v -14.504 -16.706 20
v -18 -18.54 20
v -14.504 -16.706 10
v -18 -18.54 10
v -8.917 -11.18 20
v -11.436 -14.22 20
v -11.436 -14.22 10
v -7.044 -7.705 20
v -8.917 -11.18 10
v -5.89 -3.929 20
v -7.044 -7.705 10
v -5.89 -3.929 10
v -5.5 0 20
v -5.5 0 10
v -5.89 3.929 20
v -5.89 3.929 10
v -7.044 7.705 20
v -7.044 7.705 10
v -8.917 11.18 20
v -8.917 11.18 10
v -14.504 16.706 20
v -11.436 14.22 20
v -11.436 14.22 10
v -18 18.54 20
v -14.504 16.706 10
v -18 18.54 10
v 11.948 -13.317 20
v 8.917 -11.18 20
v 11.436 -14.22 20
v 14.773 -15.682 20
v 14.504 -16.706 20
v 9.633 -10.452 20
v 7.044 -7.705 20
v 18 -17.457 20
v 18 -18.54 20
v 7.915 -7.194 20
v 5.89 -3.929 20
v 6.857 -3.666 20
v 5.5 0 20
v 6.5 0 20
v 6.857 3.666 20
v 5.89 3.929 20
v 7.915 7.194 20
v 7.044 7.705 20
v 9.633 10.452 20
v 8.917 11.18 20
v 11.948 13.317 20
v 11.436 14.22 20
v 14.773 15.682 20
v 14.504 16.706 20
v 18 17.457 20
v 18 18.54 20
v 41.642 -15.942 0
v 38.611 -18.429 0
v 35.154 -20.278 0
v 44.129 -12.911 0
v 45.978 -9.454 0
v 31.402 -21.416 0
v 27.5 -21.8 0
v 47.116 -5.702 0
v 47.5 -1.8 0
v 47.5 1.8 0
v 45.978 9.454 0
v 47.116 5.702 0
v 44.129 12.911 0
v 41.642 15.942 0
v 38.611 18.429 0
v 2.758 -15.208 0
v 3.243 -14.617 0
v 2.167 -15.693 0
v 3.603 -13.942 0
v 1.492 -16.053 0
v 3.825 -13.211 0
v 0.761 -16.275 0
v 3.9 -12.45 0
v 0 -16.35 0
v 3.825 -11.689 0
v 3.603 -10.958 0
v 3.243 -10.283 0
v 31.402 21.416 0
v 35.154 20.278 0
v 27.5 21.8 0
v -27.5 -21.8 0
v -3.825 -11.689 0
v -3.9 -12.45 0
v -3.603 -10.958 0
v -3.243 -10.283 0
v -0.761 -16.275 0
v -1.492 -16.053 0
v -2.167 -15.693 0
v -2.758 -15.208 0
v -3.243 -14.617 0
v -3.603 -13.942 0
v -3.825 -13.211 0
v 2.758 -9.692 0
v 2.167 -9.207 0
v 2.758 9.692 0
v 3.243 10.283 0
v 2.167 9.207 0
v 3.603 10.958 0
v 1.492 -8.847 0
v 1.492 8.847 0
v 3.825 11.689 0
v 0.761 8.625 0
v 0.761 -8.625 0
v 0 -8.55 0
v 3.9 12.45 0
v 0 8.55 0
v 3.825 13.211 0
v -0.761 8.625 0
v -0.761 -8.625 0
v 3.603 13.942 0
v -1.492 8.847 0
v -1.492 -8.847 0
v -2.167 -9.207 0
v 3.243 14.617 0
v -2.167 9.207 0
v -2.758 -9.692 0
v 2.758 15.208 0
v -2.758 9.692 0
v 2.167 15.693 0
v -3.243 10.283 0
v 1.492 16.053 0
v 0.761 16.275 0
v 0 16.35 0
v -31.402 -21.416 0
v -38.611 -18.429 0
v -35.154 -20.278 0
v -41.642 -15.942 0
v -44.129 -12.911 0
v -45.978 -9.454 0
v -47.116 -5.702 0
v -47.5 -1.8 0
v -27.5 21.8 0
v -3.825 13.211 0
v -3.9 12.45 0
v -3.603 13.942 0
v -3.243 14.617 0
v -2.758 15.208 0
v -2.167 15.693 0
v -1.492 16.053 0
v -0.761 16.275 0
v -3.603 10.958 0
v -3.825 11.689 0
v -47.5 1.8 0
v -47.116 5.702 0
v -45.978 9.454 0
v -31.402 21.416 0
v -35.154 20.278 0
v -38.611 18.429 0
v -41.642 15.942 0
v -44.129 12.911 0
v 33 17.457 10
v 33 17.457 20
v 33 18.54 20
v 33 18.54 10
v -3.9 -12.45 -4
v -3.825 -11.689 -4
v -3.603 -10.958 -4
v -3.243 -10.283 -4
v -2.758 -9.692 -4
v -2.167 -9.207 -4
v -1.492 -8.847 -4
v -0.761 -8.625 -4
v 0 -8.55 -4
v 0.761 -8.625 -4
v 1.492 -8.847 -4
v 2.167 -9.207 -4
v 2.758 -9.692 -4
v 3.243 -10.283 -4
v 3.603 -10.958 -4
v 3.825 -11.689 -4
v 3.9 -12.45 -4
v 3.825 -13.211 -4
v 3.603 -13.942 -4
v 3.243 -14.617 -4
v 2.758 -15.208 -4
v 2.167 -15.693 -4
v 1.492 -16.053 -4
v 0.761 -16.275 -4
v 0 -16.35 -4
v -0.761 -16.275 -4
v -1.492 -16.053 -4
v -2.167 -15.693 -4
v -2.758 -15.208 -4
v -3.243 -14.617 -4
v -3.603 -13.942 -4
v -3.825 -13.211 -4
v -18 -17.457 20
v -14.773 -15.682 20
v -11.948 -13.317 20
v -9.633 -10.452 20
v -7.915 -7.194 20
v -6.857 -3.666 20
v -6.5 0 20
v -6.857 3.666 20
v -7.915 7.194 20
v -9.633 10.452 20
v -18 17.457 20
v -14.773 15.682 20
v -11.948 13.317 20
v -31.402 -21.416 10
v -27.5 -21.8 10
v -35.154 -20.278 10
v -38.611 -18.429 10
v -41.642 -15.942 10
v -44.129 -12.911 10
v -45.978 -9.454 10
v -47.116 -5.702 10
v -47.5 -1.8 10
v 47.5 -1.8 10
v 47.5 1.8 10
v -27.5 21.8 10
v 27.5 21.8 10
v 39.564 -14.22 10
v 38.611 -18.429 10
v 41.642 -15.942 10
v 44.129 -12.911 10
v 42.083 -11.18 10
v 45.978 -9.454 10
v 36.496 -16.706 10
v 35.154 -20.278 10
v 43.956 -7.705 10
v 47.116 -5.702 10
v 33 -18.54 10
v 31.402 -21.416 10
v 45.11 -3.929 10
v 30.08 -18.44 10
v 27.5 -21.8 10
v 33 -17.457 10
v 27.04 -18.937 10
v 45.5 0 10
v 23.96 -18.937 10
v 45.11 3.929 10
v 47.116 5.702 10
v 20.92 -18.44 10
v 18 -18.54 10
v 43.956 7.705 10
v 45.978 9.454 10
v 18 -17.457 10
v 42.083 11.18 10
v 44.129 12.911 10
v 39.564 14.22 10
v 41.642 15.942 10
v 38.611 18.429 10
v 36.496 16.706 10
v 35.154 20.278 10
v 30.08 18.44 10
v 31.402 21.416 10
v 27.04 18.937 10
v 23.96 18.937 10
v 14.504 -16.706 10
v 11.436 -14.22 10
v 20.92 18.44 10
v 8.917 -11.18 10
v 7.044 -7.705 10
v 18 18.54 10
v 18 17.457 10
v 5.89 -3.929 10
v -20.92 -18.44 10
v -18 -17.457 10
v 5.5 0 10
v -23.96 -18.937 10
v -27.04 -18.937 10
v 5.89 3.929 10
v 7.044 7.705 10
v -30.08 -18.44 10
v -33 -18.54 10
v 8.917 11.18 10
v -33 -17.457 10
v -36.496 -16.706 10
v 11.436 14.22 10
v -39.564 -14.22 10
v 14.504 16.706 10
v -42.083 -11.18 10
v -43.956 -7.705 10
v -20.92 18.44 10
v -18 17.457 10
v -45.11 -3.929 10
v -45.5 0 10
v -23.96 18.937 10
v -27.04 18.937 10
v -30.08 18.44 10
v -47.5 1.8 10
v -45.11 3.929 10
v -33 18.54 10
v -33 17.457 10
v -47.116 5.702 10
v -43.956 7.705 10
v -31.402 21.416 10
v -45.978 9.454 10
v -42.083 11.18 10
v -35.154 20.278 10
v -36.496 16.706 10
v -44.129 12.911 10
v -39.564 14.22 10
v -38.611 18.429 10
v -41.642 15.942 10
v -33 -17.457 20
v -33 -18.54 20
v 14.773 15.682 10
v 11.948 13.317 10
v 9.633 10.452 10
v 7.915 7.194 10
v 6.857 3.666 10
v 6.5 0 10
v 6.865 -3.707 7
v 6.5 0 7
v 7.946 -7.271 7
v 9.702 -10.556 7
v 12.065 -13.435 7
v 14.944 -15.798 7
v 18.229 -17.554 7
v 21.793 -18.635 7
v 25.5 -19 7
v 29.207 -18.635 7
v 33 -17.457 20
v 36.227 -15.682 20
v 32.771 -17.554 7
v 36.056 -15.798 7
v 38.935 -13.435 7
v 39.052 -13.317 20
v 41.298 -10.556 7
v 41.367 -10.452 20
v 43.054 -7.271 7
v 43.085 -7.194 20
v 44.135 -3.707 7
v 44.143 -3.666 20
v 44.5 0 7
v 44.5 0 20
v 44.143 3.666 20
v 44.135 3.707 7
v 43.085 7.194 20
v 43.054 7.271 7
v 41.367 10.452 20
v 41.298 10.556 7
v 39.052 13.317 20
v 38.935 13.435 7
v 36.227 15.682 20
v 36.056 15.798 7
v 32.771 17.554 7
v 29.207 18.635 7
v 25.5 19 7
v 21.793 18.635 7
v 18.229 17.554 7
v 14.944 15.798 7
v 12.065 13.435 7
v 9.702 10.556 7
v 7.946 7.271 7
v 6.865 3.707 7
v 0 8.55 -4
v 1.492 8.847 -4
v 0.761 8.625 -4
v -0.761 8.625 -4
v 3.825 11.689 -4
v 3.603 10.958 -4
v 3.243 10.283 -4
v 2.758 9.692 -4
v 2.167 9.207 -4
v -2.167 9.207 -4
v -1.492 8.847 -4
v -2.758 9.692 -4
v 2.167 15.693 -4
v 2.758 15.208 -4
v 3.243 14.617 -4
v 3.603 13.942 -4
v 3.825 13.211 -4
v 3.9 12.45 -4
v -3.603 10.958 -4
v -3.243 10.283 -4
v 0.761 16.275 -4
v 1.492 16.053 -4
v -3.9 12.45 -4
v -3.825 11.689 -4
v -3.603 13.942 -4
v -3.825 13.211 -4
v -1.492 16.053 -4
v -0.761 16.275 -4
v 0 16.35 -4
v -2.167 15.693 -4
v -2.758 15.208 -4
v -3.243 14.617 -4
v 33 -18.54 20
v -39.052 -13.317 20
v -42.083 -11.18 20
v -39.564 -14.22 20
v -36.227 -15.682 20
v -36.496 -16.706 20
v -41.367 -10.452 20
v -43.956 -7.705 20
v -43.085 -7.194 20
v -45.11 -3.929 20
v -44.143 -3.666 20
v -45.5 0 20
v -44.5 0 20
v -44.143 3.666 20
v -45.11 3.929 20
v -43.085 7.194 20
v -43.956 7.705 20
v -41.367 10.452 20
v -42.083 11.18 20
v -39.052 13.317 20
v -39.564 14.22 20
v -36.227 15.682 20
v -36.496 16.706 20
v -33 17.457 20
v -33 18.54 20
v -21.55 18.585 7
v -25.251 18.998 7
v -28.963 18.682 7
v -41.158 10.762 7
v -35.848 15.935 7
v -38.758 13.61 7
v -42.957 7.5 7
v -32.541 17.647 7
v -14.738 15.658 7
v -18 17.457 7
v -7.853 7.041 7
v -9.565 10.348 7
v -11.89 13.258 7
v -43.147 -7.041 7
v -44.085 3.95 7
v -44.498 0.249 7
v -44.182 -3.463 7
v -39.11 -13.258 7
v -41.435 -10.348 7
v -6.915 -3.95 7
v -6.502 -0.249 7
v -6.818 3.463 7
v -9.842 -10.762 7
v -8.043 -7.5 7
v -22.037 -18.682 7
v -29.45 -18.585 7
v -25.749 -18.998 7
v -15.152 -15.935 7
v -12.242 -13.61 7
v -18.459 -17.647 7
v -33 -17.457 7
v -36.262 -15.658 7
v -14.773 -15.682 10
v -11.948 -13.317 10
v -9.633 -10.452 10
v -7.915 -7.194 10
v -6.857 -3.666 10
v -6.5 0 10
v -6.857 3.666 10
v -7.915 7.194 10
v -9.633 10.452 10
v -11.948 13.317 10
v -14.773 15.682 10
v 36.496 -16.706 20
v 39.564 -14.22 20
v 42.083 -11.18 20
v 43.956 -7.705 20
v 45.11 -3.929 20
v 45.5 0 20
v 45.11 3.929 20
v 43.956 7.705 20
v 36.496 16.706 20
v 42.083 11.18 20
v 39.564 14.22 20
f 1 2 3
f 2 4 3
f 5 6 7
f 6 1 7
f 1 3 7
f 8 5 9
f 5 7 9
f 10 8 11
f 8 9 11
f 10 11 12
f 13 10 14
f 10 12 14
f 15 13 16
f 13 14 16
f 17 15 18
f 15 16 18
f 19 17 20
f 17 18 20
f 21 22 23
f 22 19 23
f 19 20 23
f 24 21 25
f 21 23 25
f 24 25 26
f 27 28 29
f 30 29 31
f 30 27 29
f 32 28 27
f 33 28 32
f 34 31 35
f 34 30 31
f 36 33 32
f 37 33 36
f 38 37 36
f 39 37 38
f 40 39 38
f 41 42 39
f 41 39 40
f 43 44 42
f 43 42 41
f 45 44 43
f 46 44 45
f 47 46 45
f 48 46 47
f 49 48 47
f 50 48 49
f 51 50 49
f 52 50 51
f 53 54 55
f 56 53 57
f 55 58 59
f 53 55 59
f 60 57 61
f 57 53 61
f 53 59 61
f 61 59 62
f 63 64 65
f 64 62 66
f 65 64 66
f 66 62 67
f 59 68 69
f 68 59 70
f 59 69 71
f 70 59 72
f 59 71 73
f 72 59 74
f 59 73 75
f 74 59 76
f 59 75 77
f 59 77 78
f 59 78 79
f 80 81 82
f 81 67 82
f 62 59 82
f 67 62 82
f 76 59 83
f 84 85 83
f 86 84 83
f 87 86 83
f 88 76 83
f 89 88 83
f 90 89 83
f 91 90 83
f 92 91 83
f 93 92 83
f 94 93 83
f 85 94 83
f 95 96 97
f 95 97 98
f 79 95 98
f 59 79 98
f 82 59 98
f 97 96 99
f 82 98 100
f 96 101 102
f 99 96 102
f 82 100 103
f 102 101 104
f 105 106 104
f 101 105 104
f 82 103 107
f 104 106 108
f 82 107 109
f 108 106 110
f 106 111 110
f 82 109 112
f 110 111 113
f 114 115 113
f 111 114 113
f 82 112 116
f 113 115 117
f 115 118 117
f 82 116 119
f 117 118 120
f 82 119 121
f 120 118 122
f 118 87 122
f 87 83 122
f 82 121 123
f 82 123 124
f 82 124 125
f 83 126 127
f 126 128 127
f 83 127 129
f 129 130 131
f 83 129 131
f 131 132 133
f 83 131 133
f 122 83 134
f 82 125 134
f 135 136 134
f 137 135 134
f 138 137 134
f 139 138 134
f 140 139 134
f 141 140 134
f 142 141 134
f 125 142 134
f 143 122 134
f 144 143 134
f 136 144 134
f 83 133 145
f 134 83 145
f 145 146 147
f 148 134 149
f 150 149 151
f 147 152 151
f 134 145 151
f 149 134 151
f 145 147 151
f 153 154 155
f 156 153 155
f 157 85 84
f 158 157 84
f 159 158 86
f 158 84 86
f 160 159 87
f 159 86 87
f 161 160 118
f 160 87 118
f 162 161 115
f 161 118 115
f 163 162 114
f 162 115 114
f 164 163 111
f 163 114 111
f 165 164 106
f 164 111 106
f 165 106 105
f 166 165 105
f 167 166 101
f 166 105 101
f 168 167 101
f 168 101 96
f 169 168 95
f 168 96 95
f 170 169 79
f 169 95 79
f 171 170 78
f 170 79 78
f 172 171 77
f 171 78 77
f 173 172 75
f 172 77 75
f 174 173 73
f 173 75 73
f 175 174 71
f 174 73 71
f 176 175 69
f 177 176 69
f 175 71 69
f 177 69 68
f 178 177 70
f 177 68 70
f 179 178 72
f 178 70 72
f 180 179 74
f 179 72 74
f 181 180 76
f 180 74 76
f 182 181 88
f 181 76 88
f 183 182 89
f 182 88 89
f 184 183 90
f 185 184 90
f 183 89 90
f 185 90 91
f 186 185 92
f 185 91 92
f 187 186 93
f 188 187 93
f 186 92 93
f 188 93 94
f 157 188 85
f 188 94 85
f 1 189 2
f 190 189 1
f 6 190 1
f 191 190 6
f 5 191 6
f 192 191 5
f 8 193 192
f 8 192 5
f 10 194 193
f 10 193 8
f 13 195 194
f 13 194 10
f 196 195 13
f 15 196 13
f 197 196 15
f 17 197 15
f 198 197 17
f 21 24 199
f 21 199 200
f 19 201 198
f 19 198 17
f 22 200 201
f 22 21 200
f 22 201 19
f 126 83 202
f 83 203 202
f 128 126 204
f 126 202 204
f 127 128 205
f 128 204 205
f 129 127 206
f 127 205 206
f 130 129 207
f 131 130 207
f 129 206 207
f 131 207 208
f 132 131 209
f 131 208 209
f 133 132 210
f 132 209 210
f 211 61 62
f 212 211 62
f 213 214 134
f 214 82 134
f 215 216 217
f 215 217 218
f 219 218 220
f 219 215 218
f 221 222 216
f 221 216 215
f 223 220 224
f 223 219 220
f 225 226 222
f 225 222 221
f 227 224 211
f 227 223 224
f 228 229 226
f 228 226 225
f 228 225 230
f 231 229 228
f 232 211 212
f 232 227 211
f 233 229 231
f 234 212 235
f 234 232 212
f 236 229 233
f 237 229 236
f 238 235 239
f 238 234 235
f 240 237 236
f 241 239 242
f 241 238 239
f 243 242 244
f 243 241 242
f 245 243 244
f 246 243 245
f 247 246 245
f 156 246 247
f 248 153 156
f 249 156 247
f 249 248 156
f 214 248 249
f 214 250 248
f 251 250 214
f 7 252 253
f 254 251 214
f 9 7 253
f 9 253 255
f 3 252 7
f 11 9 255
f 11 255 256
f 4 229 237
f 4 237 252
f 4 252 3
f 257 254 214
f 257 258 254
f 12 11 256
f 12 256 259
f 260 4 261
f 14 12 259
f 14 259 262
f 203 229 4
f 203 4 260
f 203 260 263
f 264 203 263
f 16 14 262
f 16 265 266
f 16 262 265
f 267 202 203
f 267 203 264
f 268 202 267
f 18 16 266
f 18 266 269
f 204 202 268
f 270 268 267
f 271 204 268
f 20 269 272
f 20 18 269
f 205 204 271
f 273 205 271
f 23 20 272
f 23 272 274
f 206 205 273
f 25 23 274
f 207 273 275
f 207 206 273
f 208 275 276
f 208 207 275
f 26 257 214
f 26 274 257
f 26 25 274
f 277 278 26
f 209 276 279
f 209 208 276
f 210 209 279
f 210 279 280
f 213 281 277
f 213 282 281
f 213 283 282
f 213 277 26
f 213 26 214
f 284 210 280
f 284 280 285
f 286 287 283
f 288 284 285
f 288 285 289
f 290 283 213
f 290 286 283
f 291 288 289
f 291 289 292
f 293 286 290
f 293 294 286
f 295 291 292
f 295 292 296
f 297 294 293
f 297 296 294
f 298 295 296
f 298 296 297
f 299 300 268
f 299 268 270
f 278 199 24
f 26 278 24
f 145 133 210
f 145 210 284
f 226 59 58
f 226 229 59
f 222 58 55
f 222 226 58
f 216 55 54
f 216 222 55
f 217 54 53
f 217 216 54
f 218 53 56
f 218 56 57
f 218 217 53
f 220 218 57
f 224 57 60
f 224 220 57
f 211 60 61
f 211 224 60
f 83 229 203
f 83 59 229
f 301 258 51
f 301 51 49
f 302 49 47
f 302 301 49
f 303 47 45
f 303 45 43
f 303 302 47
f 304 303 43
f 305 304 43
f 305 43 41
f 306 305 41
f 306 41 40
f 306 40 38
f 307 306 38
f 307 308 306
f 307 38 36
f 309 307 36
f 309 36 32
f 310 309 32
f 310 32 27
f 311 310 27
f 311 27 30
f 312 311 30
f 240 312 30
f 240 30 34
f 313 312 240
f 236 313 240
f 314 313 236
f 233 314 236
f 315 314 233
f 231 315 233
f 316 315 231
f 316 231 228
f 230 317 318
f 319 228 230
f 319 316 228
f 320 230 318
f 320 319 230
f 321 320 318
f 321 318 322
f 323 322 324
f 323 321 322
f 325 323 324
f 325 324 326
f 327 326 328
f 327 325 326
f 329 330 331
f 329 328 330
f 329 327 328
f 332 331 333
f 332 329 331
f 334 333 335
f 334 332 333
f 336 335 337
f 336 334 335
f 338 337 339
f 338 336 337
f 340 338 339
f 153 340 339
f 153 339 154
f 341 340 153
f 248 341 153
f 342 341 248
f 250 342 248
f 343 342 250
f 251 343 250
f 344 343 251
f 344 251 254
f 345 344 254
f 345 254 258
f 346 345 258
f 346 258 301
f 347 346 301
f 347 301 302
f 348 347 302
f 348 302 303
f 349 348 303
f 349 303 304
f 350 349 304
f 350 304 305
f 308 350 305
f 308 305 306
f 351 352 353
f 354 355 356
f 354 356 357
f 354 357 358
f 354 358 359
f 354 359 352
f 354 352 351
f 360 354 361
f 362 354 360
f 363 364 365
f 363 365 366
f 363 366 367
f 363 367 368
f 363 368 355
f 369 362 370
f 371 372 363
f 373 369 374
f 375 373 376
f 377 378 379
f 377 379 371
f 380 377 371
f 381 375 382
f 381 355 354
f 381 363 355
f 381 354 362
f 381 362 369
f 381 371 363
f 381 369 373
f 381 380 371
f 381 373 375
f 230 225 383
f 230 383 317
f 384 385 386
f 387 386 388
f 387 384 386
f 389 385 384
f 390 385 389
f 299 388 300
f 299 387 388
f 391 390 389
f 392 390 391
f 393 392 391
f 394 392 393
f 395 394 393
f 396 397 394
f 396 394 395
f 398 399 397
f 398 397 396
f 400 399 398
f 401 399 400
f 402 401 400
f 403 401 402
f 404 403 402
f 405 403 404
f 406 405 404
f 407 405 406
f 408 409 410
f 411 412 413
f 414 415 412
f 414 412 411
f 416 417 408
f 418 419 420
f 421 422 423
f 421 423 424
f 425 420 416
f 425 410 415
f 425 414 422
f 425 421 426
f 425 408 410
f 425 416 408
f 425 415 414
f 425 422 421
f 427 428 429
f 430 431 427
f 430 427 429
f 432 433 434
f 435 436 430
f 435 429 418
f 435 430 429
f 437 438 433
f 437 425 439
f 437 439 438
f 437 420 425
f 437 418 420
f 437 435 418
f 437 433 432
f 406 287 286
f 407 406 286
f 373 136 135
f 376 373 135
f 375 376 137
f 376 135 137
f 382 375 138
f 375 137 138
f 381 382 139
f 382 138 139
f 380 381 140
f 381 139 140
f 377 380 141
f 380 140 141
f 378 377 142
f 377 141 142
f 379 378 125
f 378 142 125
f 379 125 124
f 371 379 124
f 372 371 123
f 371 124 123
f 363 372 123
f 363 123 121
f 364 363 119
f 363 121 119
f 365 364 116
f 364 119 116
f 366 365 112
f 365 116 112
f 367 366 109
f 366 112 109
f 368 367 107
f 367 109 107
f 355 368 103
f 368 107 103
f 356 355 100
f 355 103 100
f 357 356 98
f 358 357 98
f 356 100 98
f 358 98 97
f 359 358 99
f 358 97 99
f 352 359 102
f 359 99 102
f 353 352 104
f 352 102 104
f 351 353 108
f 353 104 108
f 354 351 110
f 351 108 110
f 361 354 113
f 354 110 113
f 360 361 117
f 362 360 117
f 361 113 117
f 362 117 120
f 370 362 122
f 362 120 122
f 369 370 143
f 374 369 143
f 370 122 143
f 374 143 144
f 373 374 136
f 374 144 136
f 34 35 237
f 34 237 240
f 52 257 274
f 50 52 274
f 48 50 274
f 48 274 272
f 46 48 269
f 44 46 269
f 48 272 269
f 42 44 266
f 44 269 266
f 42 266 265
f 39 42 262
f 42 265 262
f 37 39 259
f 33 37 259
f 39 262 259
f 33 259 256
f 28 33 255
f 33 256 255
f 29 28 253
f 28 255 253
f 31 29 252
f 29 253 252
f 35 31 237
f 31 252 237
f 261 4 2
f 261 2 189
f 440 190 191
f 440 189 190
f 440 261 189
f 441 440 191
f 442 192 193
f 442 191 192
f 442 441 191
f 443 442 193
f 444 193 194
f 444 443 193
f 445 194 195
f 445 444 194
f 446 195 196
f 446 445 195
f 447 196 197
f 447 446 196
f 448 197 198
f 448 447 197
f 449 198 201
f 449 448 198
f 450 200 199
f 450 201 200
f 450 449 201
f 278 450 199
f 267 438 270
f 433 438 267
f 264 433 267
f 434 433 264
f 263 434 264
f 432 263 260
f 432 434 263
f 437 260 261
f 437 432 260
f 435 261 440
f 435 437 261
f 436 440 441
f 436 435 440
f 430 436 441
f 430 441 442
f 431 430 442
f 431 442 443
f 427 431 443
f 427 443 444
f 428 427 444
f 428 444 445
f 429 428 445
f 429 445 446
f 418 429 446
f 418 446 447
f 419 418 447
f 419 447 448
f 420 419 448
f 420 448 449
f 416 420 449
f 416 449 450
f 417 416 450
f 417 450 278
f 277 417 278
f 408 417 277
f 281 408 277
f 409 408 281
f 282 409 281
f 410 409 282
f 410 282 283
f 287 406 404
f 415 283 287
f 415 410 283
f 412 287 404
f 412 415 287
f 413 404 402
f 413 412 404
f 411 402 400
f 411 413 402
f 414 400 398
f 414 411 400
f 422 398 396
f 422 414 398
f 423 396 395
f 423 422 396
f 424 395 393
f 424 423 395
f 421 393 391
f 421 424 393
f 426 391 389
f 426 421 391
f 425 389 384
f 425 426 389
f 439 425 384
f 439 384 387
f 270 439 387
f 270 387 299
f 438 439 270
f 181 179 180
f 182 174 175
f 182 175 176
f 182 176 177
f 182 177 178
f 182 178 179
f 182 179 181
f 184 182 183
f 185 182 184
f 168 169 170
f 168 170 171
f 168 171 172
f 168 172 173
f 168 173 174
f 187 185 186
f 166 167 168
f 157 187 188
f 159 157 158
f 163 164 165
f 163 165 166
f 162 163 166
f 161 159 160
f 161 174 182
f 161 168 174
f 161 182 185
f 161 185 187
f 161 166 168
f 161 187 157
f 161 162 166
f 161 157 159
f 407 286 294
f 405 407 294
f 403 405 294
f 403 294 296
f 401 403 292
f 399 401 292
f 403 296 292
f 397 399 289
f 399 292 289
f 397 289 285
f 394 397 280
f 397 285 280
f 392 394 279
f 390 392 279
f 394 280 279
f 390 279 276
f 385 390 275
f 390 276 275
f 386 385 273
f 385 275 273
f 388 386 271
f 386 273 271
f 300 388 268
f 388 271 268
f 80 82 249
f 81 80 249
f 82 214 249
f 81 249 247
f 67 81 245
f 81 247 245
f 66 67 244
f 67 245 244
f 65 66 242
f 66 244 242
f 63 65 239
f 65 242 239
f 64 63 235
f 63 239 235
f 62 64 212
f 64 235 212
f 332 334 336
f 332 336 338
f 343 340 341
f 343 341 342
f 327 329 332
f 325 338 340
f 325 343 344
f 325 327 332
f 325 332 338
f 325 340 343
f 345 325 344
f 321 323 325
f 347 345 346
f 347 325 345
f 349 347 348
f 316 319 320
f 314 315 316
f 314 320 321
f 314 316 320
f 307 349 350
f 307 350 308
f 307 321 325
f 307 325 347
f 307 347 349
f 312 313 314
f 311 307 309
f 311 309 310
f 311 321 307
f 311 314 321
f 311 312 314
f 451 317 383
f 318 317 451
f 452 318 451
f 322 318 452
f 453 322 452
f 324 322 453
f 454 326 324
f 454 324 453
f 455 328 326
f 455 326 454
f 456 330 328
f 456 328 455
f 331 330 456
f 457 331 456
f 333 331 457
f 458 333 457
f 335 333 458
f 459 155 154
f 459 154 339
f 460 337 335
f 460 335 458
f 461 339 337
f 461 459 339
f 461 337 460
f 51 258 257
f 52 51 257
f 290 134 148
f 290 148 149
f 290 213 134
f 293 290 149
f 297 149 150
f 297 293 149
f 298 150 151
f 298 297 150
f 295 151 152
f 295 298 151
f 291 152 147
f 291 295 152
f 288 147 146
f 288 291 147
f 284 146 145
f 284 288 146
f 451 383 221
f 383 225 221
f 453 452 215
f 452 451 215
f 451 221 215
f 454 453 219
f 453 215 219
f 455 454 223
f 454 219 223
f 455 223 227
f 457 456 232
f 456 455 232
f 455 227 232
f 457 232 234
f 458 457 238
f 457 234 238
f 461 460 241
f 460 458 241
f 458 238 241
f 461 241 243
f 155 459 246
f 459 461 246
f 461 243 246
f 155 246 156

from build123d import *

# Parameters (mm, degrees)
SKETCH1_W           = 43.6
SKETCH1_H           = 95
BOSS_EXTRUDE1_DEPTH = 10
SKETCH2_R           = 3.9
BOSS_EXTRUDE2_DEPTH = 4
SKETCH5_R           = 20
SKETCH5_R_2         = 19
BOSS_EXTRUDE4_DEPTH = 10
SKETCH6_W           = 15
SKETCH6_H           = 43.6
CUT_EXTRUDE1_DEPTH  = 10
FILLET1_R           = 20
CUT_EXTRUDE2_START  = -3
SKETCH7_R           = 19
CUT_EXTRUDE2_DEPTH  = 3


with BuildPart() as part:
    # Sketch1 → Boss-Extrude1 (new body)
    with BuildSketch(Plane(origin=(0, 0, 0), x_dir=(0, 1, 0), z_dir=(0, 0, 1))):
        Rectangle(SKETCH1_W, SKETCH1_H)
    extrude(amount=BOSS_EXTRUDE1_DEPTH)

    # Sketch2 → Boss-Extrude2 (add)
    with BuildSketch(Plane(origin=(0, 0, 0), x_dir=(1, 0, 0), z_dir=(0, 0, -1))):
        with Locations(Location((0, 12.45, 0), (0, 0, 180))):
            Circle(SKETCH2_R)
        with Locations(Location((0, -12.45, 0), (0, 0, 180))):
            Circle(SKETCH2_R)
    extrude(amount=BOSS_EXTRUDE2_DEPTH)

    # Sketch5 → Boss-Extrude4 (add)
    # profile 1 of 2: a face of its own
    with BuildSketch(Plane.XY.offset(10)):
        with Locations((-25.5, 0)):
            Circle(SKETCH5_R)
        with Locations((-25.5, 0)):
            Circle(SKETCH5_R_2, mode=Mode.SUBTRACT)
    # profile 2 of 2: a face of its own
    with BuildSketch(Plane.XY.offset(10)):
        with Locations((25.5, 0)):
            Circle(SKETCH5_R)
        with Locations((25.5, 0)):
            Circle(SKETCH5_R_2, mode=Mode.SUBTRACT)
    extrude(amount=BOSS_EXTRUDE4_DEPTH)

    # Sketch6 → Cut-Extrude1 (cut)
    with BuildSketch(Plane.XY.offset(20)):
        with Locations((-25.5, 0)):
            Rectangle(SKETCH6_W, SKETCH6_H)
        with Locations((25.5, 0)):
            Rectangle(SKETCH6_W, SKETCH6_H)
    extrude(amount=-CUT_EXTRUDE1_DEPTH, mode=Mode.SUBTRACT)

    # Fillet1
    fillet1_edges = [part.edges().sort_by_distance(p)[0] for p in [
        (47.5, 21.8, 5),
        (47.5, -21.8, 5),
        (-47.5, -21.8, 5),
        (-47.5, 21.8, 5),
    ]]
    fillet(fillet1_edges, radius=FILLET1_R)

    # Sketch7 → Cut-Extrude2 (cut)
    with BuildSketch(Plane.XY.offset(10).offset(CUT_EXTRUDE2_START)):
        with Locations(Location((-25.5, 0, 0), (0, 0, 246.750437409))):
            Circle(SKETCH7_R)
        with Locations(Location((25.5, 0, 0), (0, 0, 180))):
            Circle(SKETCH7_R)
    extrude(amount=CUT_EXTRUDE2_DEPTH, mode=Mode.SUBTRACT)


solid = part.part
